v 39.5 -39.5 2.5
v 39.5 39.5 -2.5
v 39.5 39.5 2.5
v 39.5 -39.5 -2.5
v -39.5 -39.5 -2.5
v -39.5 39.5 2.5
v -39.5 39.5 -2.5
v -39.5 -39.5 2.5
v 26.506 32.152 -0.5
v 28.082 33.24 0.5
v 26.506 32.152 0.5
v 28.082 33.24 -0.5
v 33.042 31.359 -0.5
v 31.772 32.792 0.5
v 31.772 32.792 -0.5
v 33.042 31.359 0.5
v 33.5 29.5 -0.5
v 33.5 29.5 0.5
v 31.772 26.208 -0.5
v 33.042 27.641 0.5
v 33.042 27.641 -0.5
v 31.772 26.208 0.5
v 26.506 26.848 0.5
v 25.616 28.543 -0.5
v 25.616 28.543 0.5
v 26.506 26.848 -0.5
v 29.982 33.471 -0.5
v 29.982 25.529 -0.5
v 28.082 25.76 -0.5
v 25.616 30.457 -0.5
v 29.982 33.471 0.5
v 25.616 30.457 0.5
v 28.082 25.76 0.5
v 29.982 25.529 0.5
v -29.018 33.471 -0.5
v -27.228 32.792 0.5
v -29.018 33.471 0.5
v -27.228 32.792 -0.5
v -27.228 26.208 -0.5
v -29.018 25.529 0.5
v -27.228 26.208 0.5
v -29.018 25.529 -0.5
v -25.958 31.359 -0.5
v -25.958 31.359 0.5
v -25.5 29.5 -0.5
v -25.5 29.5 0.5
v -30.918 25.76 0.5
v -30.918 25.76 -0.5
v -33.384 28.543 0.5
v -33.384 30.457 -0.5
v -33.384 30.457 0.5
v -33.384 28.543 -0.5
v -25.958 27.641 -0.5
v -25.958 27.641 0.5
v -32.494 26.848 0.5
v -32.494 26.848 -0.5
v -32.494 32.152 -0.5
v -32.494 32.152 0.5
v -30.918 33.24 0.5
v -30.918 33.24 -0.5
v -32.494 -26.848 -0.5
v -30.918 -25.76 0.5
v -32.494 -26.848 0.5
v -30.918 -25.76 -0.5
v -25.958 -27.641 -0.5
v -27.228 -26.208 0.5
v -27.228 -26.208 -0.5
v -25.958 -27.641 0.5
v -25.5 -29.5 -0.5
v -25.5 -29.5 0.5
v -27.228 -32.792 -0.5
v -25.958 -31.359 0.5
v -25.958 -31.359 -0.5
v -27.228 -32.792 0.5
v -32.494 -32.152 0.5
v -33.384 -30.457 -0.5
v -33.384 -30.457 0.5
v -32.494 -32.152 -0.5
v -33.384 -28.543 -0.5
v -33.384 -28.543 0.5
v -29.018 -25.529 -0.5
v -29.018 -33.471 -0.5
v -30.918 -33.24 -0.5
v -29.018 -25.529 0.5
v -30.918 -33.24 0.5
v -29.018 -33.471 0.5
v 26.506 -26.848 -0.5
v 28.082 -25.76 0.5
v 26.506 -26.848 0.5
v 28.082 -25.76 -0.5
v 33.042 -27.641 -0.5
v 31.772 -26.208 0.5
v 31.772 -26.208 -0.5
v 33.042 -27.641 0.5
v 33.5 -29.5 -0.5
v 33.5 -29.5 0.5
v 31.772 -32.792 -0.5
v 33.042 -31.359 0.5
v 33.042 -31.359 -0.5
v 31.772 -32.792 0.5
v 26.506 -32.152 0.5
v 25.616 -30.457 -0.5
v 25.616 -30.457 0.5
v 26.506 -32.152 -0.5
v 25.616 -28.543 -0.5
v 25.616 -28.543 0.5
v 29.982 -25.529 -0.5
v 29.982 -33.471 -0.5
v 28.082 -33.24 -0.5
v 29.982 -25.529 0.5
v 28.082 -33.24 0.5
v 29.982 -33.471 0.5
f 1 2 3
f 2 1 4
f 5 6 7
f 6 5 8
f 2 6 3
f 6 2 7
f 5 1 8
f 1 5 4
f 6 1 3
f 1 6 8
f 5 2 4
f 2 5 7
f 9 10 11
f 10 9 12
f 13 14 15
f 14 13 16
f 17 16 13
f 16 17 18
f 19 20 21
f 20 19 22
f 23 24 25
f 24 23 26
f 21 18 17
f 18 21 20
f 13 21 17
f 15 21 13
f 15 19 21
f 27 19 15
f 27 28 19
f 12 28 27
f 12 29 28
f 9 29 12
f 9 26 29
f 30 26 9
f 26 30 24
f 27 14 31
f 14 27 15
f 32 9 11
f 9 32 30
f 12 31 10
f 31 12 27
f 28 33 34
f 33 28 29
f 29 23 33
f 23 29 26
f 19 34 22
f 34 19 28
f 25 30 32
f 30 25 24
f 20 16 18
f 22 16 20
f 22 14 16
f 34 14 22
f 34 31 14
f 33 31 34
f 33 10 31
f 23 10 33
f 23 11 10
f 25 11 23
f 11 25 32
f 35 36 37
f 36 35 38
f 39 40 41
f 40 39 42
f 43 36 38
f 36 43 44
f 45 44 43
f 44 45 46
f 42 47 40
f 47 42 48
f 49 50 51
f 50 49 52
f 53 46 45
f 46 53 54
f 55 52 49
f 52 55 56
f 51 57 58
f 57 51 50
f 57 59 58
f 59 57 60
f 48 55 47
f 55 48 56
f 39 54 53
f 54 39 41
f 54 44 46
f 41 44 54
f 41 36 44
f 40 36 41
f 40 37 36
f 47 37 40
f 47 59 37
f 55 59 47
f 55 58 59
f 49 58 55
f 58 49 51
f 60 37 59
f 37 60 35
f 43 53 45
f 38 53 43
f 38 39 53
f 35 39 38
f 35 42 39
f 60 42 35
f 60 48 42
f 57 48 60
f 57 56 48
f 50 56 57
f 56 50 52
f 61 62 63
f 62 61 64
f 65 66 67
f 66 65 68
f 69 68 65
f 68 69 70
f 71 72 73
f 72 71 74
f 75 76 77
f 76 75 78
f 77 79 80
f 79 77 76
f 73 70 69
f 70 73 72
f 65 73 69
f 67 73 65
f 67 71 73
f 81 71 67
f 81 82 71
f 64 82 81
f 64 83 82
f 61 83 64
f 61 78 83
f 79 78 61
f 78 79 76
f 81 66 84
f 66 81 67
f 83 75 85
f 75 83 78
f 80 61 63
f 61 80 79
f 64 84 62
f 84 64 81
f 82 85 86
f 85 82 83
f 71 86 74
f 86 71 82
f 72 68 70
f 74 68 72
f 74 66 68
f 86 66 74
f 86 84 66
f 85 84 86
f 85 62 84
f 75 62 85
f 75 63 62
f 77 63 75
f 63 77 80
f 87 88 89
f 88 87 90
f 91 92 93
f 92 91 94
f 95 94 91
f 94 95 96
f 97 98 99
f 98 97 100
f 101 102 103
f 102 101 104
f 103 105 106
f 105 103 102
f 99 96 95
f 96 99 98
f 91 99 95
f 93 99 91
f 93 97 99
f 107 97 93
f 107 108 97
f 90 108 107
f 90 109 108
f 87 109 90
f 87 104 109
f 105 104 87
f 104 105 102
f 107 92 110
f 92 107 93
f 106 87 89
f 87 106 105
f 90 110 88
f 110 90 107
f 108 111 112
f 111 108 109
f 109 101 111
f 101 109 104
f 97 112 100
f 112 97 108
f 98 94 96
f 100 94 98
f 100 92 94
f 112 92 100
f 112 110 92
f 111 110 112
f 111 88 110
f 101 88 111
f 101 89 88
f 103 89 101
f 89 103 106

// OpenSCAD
fn = 30;

module pump_body(wall_padding, innner_d, outer_d, tubing_r, arm_radius, arm_mount_radius, top_padding){
  width = tubing_r*2 + wall_padding*2 + outer_d;
  height = outer_d + top_padding*2;
  holeR = 4;
  hole_wall_offset = 10;
  hole_w = width/2-hole_wall_offset;

  difference(){
   union(){
    difference(){
     cube(size = [width, width, height], center=true);
     union(){
      torus(tubing_r, outer_d/2);
      cylinder(r = tubing_r, h = outer_d, center=true, $fn = fn);
      rotate([0,0, 30]) translate(v=[ tubing_r, 25, 0]) rotate([90,0,0]) cylinder(r=outer_d/2, h=50, center=true, $fn = fn);
      rotate([0,0,-30]) translate(v=[-tubing_r, 25, 0]) rotate([90,0,0]) cylinder(r=outer_d/2, h=50, center=true, $fn = fn); 
      cylinder(r=arm_radius + arm_mount_radius + 0.5, h=height*4, center=true, $fn = fn);  // center
     }
    }
    translate([0,0,-height/2-wall_padding/2 + 0.1]) cube(size = [width, width, wall_padding], center=true);
    difference(){
     translate([0,0, height/2+wall_padding/2 - 0.1]) cube(size = [width, width, wall_padding], center=true);
     nema_bolts(100);
    }
   }
   union(){
    translate(v=[hole_w,hole_w,0]) cylinder(r = holeR, h = height*3, center=true);
    translate(v=[-hole_w,hole_w,0]) cylinder(r = holeR, h = height*3, center=true);
    translate(v=[-hole_w,-hole_w,0]) cylinder(r = holeR, h = height*3, center=true);
    translate(v=[hole_w,-hole_w,0]) cylinder(r = holeR, h = height*3, center=true);
   }
  }
}

module nema_bolts(h){
  holeL = 47.14/2; //distance between hole centres
  holeR = 5.21/2;
  translate(v=[holeL,holeL,0]) cylinder(r = holeR, h = h, center=true);
  translate(v=[-holeL,holeL,0]) cylinder(r = holeR, h = h, center=true);
  translate(v=[-holeL,-holeL,0]) cylinder(r = holeR, h = h, center=true);
  translate(v=[holeL,-holeL,0]) cylinder(r = holeR, h = h, center=true);
}

module sdfasfd(){
    union(){
	translate(v=[0,0,outer_d/2+wall_padding]) torus(tubing_r, torus_r);
       translate(v=[0,0,outer_d/2+wall_padding]) cylinder(r = tubing_r, h = outer_d, center=true, $fn = fn);  // center hollow
       translate(v=[tubing_r, 25, outer_d/2+wall_padding])   rotate([90,0,0]) cylinder(r = outer_d/2, h =50, center=true, $fn = fn);  // exit liquid tube
	translate(v=[-tubing_r, 25, outer_d/2+wall_padding])   rotate([90,0,0]) cylinder(r = outer_d/2, h =50, center=true, $fn = fn);  // exit liquid tube
      	translate(v=[0,0,-5.5]) cylinder(r=shaftR*1.1, h=50, center=true, $fn = fn);  // center axle
      	translate(v=[0,0,-2.5]) cylinder(r=11, h=10, center=true, $fn = fn);  // center
      	translate(v=[holeL,holeL,0-bodyL/2]) cylinder(r = holeR, h = bodyL+10, center=true, $fn = fn);  // bolts
      	translate(v=[-holeL,holeL,0-bodyL/2]) cylinder(r = holeR, h = bodyL+10, center=true, $fn = fn);  // bolts
      	translate(v=[-holeL,-holeL,0-bodyL/2]) cylinder(r = holeR, h = bodyL+10, center=true, $fn = fn);  // bolts
      	translate(v=[holeL,-holeL,0-bodyL/2]) cylinder(r = holeR, h = bodyL+10, center=true, $fn = fn);  // bolts
    };
}


module torus(radius, pipe_radius, vertical_offset){
  rotate_extrude(convexity = 10, $fn = fn) translate([radius, 0, 0]) circle(r = pipe_radius); 
}

tubing_r = 30; 
pump_body(5, 7, 9, tubing_r);
